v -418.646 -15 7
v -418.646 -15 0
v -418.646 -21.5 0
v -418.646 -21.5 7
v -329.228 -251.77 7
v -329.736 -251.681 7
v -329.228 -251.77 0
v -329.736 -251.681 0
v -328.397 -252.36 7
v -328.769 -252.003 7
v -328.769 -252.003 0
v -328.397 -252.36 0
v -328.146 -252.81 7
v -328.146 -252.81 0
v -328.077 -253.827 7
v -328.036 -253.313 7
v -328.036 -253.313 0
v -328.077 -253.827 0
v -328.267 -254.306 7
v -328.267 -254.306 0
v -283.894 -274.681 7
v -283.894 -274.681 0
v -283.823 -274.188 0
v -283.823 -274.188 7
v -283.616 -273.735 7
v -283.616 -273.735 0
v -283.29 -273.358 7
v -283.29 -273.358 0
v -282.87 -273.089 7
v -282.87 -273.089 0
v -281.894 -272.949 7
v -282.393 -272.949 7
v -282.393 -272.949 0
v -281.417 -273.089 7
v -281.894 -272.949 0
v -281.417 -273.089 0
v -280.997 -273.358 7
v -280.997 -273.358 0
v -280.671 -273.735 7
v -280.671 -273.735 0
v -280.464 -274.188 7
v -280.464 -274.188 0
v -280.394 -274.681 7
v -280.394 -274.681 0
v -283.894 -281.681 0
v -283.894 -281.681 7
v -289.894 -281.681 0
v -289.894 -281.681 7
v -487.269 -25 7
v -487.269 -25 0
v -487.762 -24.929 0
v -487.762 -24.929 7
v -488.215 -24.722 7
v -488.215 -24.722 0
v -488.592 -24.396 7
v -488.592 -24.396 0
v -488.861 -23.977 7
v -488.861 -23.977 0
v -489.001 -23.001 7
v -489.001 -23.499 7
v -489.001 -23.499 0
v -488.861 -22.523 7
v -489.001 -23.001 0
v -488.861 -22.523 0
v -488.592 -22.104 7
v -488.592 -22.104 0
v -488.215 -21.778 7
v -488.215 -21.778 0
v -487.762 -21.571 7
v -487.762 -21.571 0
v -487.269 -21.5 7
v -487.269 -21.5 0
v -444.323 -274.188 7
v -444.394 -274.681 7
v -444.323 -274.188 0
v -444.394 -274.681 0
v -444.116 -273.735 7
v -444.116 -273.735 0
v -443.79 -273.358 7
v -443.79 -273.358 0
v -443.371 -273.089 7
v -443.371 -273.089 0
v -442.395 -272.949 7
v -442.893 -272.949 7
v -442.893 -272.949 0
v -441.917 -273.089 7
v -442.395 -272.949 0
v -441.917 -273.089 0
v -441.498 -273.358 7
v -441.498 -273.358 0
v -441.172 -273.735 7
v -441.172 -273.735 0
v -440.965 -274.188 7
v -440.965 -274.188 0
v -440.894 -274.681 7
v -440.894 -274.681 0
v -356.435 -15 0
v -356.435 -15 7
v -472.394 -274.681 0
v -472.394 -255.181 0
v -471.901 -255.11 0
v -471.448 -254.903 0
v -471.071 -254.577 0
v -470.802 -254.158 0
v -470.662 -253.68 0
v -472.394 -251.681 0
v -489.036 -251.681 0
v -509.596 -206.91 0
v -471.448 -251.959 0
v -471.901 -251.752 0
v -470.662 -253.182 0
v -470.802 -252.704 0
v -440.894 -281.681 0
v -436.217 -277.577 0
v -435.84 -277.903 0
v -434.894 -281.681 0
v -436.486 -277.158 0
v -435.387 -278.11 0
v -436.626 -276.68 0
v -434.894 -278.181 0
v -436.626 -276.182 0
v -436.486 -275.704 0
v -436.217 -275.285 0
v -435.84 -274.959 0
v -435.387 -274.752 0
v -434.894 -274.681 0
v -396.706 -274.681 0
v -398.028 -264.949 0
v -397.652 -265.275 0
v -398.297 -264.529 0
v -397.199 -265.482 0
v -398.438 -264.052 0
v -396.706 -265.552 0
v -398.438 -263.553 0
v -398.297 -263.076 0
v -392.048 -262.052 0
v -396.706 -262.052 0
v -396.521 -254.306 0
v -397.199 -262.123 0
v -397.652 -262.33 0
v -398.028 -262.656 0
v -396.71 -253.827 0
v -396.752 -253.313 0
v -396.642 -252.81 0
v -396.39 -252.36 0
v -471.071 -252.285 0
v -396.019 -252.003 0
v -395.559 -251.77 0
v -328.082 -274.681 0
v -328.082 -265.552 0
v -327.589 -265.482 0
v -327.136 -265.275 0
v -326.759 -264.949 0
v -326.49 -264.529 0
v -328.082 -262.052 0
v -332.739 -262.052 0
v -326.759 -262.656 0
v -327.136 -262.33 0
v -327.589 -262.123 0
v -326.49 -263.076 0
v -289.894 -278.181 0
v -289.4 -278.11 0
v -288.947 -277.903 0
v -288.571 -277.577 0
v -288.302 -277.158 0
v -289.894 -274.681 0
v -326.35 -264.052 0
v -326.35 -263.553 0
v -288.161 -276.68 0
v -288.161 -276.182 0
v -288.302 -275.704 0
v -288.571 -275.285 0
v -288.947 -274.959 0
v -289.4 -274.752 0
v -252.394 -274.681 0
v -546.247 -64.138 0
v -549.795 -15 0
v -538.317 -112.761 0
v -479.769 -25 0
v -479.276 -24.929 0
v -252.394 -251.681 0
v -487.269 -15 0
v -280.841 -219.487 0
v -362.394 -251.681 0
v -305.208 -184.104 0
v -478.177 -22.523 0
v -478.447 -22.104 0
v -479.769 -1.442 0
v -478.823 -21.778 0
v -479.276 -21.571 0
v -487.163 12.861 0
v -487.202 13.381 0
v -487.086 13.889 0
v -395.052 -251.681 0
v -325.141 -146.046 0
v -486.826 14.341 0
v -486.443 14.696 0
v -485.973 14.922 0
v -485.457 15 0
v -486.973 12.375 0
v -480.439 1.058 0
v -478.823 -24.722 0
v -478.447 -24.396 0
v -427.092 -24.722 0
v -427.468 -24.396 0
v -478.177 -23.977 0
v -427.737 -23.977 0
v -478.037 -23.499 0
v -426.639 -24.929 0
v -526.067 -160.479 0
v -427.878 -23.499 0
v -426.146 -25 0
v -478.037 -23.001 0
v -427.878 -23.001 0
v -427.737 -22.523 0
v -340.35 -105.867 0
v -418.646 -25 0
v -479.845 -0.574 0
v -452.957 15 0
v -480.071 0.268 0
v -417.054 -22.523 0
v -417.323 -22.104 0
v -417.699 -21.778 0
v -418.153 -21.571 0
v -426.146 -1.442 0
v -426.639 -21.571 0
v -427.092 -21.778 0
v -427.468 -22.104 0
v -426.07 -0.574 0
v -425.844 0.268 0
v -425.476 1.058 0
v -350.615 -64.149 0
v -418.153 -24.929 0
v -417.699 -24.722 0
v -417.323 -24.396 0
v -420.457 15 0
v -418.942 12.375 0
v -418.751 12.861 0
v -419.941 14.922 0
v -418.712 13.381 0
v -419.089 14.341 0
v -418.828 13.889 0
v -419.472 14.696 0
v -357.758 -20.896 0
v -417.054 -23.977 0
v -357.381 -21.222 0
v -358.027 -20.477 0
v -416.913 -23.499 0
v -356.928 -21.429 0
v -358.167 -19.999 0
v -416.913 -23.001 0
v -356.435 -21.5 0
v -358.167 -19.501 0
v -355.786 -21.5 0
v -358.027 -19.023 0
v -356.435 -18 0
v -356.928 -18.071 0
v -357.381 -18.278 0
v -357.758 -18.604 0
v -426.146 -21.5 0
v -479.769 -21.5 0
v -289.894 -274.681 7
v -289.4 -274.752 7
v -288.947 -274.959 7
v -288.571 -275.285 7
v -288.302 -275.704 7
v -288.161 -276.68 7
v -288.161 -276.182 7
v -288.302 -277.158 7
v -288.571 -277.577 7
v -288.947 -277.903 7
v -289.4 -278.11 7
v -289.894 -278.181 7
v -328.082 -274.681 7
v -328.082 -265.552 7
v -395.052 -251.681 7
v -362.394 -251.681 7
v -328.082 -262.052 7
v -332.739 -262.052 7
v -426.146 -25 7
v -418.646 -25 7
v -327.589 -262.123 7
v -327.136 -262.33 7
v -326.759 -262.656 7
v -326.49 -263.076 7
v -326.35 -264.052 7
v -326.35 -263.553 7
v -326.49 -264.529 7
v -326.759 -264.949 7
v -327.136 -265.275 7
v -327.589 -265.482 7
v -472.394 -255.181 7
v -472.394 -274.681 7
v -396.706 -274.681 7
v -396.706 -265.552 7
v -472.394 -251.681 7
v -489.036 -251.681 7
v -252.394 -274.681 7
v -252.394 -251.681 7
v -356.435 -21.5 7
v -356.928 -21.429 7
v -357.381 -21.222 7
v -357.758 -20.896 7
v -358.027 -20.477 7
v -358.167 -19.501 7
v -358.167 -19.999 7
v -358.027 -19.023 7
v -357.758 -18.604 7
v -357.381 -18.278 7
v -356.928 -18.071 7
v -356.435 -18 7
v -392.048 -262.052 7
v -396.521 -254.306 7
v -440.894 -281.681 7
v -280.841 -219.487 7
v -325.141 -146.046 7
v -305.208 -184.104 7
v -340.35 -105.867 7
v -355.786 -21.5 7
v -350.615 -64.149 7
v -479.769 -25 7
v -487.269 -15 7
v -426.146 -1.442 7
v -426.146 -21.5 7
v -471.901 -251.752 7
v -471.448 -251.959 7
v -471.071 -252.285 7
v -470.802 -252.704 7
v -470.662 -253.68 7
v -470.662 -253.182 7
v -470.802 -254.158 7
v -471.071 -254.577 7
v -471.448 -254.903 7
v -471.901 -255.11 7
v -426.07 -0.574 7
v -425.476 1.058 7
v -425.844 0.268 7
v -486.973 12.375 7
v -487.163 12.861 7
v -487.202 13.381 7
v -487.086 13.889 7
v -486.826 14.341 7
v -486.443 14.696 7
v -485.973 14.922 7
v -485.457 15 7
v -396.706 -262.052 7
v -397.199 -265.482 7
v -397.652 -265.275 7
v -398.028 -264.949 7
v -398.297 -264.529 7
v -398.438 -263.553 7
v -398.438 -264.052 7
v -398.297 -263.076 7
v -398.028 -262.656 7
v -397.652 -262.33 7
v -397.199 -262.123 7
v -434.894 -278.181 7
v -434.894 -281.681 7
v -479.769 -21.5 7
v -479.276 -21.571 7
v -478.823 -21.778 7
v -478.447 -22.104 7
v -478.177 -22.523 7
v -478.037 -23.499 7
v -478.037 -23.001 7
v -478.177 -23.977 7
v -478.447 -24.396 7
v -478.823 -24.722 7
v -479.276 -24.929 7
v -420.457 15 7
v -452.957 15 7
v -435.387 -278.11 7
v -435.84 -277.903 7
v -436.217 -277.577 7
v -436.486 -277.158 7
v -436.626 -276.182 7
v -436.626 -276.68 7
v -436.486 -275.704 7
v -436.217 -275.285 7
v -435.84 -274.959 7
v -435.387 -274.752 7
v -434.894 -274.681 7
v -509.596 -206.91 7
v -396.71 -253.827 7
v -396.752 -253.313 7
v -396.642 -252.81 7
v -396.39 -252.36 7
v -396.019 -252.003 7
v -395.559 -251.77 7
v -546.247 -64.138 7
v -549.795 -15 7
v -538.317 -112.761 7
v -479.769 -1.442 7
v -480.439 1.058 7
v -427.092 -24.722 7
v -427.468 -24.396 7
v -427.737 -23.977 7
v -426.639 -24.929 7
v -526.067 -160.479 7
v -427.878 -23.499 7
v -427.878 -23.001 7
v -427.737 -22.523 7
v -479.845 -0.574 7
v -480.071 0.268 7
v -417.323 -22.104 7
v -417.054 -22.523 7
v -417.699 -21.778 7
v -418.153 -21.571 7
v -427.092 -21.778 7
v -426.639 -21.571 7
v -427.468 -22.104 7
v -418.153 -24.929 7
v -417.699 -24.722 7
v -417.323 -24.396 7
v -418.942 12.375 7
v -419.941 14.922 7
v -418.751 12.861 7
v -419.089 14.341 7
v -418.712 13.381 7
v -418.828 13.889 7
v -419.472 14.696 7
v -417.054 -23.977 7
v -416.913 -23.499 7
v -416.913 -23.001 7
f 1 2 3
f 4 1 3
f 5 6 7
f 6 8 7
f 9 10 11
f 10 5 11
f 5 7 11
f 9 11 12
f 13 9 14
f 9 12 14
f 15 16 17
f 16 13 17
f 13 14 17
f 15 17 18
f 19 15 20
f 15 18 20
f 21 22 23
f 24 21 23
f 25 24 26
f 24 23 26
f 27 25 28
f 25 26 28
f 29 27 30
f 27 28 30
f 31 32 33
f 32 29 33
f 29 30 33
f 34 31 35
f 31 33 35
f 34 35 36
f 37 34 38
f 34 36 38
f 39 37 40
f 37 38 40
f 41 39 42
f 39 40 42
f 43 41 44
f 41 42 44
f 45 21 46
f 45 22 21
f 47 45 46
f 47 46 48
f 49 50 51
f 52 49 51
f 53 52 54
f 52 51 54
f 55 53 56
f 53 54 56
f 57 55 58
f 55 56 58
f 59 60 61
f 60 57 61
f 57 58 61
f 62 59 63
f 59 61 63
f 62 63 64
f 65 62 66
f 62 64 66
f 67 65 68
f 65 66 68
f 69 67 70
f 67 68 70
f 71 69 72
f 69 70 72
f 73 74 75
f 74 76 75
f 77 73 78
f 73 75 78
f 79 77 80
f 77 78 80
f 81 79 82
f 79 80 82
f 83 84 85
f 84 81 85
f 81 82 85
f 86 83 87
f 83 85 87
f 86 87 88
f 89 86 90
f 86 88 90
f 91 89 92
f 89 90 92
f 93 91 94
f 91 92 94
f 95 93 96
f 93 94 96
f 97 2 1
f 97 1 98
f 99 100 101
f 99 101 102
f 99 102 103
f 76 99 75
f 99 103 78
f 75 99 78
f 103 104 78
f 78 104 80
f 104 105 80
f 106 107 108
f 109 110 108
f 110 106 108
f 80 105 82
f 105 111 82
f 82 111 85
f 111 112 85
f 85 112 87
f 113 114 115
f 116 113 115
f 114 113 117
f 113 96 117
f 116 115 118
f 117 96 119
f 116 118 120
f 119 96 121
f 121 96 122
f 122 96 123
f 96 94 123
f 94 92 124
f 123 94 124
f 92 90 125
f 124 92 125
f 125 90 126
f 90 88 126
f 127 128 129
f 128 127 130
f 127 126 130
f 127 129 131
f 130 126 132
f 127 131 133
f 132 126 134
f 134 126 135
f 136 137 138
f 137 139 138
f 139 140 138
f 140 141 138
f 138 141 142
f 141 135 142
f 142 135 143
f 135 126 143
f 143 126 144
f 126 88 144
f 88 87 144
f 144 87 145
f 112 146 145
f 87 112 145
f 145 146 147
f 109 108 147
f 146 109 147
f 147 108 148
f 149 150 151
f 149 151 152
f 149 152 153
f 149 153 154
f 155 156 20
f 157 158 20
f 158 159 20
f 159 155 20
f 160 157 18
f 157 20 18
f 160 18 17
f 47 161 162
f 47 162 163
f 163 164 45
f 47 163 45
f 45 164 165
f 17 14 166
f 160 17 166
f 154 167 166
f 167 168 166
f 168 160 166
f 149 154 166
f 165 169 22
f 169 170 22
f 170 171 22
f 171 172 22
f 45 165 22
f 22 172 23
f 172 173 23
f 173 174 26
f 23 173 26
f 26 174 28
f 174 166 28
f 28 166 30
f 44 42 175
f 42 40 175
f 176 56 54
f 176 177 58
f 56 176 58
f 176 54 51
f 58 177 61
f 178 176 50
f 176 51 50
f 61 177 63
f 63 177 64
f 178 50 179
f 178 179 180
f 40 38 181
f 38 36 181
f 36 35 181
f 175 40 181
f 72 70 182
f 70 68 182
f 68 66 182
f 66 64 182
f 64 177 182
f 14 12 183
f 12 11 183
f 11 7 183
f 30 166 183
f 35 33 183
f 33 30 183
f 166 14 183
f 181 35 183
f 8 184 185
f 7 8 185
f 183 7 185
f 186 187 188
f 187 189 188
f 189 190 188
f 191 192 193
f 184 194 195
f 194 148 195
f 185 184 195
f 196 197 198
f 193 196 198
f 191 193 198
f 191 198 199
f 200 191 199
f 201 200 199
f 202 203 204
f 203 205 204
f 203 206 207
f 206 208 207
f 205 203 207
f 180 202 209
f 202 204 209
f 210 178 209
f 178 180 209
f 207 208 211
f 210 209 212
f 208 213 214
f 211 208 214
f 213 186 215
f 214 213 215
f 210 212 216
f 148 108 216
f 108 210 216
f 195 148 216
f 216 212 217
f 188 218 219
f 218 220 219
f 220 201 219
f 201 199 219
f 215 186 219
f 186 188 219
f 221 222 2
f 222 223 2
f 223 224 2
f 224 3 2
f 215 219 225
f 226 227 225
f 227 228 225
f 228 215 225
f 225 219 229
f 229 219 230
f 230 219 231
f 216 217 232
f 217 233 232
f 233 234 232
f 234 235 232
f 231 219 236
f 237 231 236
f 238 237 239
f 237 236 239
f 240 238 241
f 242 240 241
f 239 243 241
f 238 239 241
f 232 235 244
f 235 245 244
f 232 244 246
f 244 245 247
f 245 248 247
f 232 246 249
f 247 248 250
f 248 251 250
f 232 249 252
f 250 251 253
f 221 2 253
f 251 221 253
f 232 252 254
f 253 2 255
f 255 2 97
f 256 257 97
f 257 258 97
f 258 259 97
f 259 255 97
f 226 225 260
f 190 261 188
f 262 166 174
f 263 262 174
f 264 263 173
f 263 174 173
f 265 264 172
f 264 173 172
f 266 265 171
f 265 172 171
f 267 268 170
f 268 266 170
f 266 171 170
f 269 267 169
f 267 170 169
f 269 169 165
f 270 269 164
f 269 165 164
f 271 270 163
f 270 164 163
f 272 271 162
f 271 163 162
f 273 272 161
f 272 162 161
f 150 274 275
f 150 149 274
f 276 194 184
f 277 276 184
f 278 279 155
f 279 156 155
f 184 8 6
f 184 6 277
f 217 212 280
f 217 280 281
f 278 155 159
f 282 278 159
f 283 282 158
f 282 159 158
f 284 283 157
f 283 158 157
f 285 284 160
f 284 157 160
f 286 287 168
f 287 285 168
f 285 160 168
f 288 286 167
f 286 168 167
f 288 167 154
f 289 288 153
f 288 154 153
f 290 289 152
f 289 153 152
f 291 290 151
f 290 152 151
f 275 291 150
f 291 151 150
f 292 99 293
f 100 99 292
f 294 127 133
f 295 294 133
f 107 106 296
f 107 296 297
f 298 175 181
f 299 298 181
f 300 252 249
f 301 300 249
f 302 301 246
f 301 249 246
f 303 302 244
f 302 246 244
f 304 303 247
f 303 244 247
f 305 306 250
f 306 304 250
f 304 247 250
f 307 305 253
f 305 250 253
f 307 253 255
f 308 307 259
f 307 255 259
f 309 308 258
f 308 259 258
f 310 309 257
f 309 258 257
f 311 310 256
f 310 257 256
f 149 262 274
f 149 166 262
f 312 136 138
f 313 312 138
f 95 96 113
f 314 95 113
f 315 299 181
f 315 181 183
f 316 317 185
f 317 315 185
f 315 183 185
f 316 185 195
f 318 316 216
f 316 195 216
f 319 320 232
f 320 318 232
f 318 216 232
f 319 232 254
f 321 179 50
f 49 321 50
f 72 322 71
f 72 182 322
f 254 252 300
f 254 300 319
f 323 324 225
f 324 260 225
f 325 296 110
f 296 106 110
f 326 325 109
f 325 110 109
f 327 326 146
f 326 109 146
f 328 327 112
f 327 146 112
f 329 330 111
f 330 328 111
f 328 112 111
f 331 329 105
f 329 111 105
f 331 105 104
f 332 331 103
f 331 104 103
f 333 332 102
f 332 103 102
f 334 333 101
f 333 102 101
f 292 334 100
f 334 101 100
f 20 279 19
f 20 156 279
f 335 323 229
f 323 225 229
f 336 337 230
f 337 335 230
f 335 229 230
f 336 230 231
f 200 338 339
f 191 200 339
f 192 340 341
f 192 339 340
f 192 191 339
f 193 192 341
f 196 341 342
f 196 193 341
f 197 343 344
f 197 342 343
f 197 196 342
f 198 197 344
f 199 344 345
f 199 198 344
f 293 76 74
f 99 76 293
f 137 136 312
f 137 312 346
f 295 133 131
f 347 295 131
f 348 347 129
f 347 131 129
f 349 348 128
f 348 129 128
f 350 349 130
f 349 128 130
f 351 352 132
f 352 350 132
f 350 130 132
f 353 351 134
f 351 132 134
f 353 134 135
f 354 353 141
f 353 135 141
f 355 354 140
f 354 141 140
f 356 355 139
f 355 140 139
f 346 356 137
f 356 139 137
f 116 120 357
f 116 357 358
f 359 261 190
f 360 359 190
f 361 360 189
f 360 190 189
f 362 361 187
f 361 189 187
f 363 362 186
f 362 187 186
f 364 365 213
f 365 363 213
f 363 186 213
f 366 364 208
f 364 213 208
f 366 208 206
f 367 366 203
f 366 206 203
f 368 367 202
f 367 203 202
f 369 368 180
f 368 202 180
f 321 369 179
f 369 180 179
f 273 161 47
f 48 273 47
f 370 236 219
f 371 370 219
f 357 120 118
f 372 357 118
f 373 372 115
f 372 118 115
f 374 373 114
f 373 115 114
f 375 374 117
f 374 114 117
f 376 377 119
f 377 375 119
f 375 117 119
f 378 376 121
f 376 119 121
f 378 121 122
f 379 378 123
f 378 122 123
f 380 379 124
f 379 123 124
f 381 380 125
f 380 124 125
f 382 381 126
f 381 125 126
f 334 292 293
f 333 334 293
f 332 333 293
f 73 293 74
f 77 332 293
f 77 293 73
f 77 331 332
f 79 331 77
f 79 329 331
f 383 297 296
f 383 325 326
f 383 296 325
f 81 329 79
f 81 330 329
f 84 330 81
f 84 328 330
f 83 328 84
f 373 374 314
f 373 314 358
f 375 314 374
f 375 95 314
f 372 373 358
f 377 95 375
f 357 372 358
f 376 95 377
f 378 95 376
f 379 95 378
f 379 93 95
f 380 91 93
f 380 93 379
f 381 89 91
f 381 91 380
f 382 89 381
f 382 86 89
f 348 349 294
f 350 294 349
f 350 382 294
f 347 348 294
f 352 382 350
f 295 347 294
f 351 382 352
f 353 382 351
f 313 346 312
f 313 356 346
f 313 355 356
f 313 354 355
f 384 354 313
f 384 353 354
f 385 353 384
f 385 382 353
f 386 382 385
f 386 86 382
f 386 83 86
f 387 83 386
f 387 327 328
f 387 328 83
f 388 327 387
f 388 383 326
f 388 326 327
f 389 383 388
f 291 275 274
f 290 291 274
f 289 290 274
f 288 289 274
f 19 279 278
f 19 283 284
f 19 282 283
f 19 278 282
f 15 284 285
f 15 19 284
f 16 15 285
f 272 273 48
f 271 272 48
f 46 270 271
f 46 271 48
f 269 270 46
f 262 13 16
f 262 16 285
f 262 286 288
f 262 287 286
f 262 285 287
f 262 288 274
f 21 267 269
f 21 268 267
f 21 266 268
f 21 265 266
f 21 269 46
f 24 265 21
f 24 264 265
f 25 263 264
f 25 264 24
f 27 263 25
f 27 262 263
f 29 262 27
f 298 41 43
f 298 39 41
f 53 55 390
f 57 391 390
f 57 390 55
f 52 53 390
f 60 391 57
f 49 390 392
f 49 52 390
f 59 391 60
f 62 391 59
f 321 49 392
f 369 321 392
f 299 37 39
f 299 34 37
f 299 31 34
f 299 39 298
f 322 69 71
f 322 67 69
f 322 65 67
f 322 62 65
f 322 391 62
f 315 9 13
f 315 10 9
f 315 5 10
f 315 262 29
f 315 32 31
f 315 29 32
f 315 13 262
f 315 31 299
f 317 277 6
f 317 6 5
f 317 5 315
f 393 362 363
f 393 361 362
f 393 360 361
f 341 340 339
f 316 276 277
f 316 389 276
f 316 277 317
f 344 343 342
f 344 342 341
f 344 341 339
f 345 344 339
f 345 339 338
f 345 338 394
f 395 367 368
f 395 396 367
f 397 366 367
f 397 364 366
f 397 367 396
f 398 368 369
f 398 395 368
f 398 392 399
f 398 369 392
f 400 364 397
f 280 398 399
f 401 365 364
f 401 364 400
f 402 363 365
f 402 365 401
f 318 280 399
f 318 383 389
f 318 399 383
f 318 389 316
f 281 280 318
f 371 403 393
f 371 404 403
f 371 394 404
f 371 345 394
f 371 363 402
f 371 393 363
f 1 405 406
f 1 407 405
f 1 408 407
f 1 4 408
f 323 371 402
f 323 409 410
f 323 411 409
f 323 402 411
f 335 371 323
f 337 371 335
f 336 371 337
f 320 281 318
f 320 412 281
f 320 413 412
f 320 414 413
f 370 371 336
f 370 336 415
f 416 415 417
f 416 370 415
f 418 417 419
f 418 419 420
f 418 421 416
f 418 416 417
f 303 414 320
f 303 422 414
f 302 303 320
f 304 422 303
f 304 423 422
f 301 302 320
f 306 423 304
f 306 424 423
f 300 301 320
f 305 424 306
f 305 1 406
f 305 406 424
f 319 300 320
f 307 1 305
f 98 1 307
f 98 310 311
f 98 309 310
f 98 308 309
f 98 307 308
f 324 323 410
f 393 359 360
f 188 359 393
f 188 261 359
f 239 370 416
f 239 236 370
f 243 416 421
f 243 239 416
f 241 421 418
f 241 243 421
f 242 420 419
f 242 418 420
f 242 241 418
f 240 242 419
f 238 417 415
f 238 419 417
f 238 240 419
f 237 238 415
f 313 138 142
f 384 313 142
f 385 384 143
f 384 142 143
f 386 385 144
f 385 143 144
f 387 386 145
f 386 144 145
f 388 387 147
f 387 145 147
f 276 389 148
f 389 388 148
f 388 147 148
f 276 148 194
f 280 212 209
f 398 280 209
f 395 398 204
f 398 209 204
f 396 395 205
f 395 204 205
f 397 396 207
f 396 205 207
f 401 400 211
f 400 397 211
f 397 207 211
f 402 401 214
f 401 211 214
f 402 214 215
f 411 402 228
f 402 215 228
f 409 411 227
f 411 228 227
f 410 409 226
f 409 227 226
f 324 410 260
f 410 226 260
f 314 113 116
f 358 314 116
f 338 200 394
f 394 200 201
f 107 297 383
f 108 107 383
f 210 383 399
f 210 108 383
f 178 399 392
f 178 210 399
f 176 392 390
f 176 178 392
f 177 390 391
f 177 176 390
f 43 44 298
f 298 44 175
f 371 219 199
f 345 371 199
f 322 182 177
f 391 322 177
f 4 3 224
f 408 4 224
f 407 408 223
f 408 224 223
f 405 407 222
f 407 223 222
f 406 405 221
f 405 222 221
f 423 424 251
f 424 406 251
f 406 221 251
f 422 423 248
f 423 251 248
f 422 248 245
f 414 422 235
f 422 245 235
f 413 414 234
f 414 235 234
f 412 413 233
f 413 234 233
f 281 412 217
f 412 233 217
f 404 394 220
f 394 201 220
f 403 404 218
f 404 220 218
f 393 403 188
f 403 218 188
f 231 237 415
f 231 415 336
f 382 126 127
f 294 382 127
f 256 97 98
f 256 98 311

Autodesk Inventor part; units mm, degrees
ref_plane "YZ Plane" through (0, 0, 0) normal (1, 0, 0) x (0, 1, 0)
ref_plane "XZ Plane" through (0, 0, 0) normal (0, 1, 0) x (-1, 0, 0)
ref_plane "XY Plane" through (0, 0, 0) normal (0, 0, 1) x (1, 0, 0)
sketch "Sketch1" plane through (0, 0, 0) normal (0, 0, 1) x (1, 0, 0)
  arc A0 (0, 550) -> (-200, 512.3475) centre (0, 0) ccw construction
  line L0 (-150, -512.3475) -> (-150, -323.3356) construction
  line L1 (-472.3938, -281.6809) -> (-252.3938, -281.6809) construction
  line L2 (-489.0365, 251.6809) -> (-252.3938, 251.6809) construction
  line L3 (-150, 323.3356) -> (-150, 512.3475) construction
  line L4 (-472.3938, 281.6809) -> (-252.3938, 281.6809) construction
  line L5 (-472.3938, -251.6809) -> (-252.3938, -251.6809) construction
  line L6 (-356.435, 15) -> (-576.435, 15) construction
  line L7 (-472.3938, -274.681) -> (-472.3938, -251.6809) construction
  line L8 (-252.3938, -281.6809) -> (-252.3938, -251.6809) construction
  line L9 (-252.3938, 281.6809) -> (-252.3938, 251.6809) construction
  line L10 (-472.3938, 281.6809) -> (-472.3938, 251.6809) construction
  line L11 (-356.435, 15) -> (-356.435, -15) construction
  line L12 (-356.435, -15) -> (-576.435, -15) construction
  line L13 (-576.435, -15) -> (-576.435, 15) construction
  arc A1 (0, 356.435) -> (-150, 323.3356) centre (0, 0) ccw construction
  arc A2 (-150, -323.3356) -> (0, -356.435) centre (0, 0) ccw construction
  arc A3 (-156.5, -512.3475) -> (-160, -512.3475) centre (-158.25, -512.3475) ccw construction
  arc A4 (-190, -512.3475) -> (-193.5, -512.3475) centre (-191.75, -512.3475) ccw construction
  line L14 (-178.75, -519.0975) -> (-175, -519.0975) construction
  line L15 (-178.75, -529.0975) -> (-175, -529.0975) construction
  line L16 (-175, -519.0975) -> (-175, -529.0975) construction
  arc A5 (-178.75, -519.0975) -> (-178.75, -522.5975) centre (-178.75, -520.8475) ccw construction
  arc A6 (-178.75, -525.5975) -> (-178.75, -529.0975) centre (-178.75, -527.3475) ccw construction
  line L17 (-171.25, -519.0975) -> (-175, -519.0975) construction
  line L18 (-171.25, -529.0975) -> (-175, -529.0975) construction
  arc A7 (-171.25, -522.5975) -> (-171.25, -519.0975) centre (-171.25, -520.8475) ccw construction
  arc A8 (-171.25, -529.0975) -> (-171.25, -525.5975) centre (-171.25, -527.3475) ccw construction
  line L19 (-252.3938, 251.6809) -> (-489.0365, 251.6809) construction
  arc A9 (-192.6667, 512.3475) -> (-190, 512.3475) centre (-191.3333, 512.3475) ccw construction
  line L20 (-157.3333, 512.3475) -> (-150, 512.3475) construction
  line L21 (-192.6667, 512.3475) -> (-200, 512.3475) construction
  arc A10 (-160, 512.3475) -> (-157.3333, 512.3475) centre (-158.6667, 512.3475) ccw construction
  line L22 (-171.25, 517.8475) -> (-175, 517.8475) construction
  line L23 (-171.25, 520.5142) -> (-171.25, 525.1809) construction
  line L24 (-161.3333, 532.3475) -> (-188.6667, 532.3475) construction
  line L25 (-190, 531.0142) -> (-190, 512.3475) construction
  line L26 (-160, 531.0142) -> (-160, 512.3475) construction
  arc A11 (-160, 531.0142) -> (-161.3333, 532.3475) centre (-161.3333, 531.0142) ccw construction
  arc A12 (-188.6667, 532.3475) -> (-190, 531.0142) centre (-188.6667, 531.0142) ccw construction
  line L27 (-171.25, 527.8475) -> (-175, 527.8475) construction
  line L28 (-175, 532.3475) -> (-175, 535.9358) construction
  line L29 (-175, 517.8475) -> (-175, 527.8475) construction
  arc A13 (-171.25, 517.8475) -> (-171.25, 520.5142) centre (-171.25, 519.1809) ccw construction
  arc A14 (-171.25, 525.1809) -> (-171.25, 527.8475) centre (-171.25, 526.5142) ccw construction
  line L30 (-178.75, 517.8475) -> (-175, 517.8475) construction
  arc A15 (-178.75, 520.5142) -> (-178.75, 517.8475) centre (-178.75, 519.1809) ccw construction
  line L31 (-178.75, 520.5142) -> (-178.75, 525.1809) construction
  arc A16 (-178.75, 527.8475) -> (-178.75, 525.1809) centre (-178.75, 526.5142) ccw construction
  line L32 (-178.75, 527.8475) -> (-175, 527.8475) construction
  arc A17 (-334.9122, -265.623) -> (-335.582, -268.123) centre (-330.582, -268.123) ccw construction
  line L33 (-328.3782, -254.3059) -> (-334.9122, -265.623) construction
  arc A18 (-328.3782, -254.3059) -> (-329.8938, -251.6809) centre (-329.8938, -253.4309) ccw construction
  line L34 (-329.8938, -251.6809) -> (-394.8938, -251.6809) construction
  line L35 (-362.3938, -251.6809) -> (-362.3938, -293.6041) construction
  arc A19 (-389.2055, -268.123) -> (-389.8754, -265.623) centre (-394.2055, -268.123) ccw construction
  arc A20 (-394.8938, -251.6809) -> (-396.4093, -254.3059) centre (-394.8938, -253.4309) ccw construction
  line L36 (-396.4093, -254.3059) -> (-389.8754, -265.623) construction
  arc A21 (-389.2055, -291.6809) -> (-389.2055, -288.1809) centre (-389.2055, -289.9309) ccw construction
  line L37 (-389.2055, -291.6809) -> (-396.7055, -291.6809) construction
  line L38 (-396.7055, -281.6809) -> (-472.3938, -281.6809) construction
  line L39 (-328.082, -281.6809) -> (-252.3938, -281.6809) construction
  line L40 (-252.3938, -287.3475) -> (-210.8964, -287.3475) construction
  arc A22 (-150, 323.3356) -> (-356.1192, -15) centre (0, 0) ccw construction
  arc A23 (-210.8964, -287.3475) -> (-150, -323.3356) centre (0, 0) ccw construction
  arc A24 (-200, 512.3475) -> (-549.7954, -15) centre (0, 0) ccw construction
  arc A25 (-472.3938, -281.6809) -> (-246.475, -491.6809) centre (0, 0) ccw construction
  line L41 (-171.25, -436.0915) -> (-171.25, -399.5915) construction
  line L42 (-178.75, -436.0915) -> (-178.75, -399.5915) construction
  line L43 (-177, -437.8415) -> (-173, -437.8415) construction
  line L44 (-177, -397.8415) -> (-173, -397.8415) construction
  arc A26 (-177, -397.8415) -> (-178.75, -399.5915) centre (-177, -399.5915) ccw construction
  arc A27 (-178.75, -436.0915) -> (-177, -437.8415) centre (-177, -436.0915) ccw construction
  arc A28 (-173, -437.8415) -> (-171.25, -436.0915) centre (-173, -436.0915) ccw construction
  arc A29 (-171.25, -399.5915) -> (-173, -397.8415) centre (-173, -399.5915) ccw construction
  line L45 (-200, -512.3475) -> (-200, -491.6809) construction
  arc A30 (-200, -491.6809) -> (-203.5, -491.6809) centre (-201.75, -491.6809) ccw construction
  line L46 (-160, -512.3475) -> (-160, -532.5975) construction
  line L47 (-161.75, -534.3475) -> (-188.25, -534.3475) construction
  line L48 (-190, -532.5975) -> (-190, -512.3475) construction
  line L49 (-171.25, -522.5975) -> (-171.25, -525.5975) construction
  line L50 (-178.75, -522.5975) -> (-178.75, -525.5975) construction
  arc A31 (-190, -532.5975) -> (-188.25, -534.3475) centre (-188.25, -532.5975) ccw construction
  arc A32 (-161.75, -534.3475) -> (-160, -532.5975) centre (-161.75, -532.5975) ccw construction
  line L51 (-156.5, -512.3475) -> (-150, -512.3475) construction
  line L52 (-193.5, -512.3475) -> (-200, -512.3475) construction
  line L53 (-203.5, -491.6809) -> (-246.475, -491.6809) construction
  arc A33 (-396.7055, -288.1809) -> (-396.7055, -291.6809) centre (-396.7055, -289.9309) ccw construction
  line L54 (-396.7055, -281.6809) -> (-396.7055, -288.1809) construction
  line L55 (-389.2055, -288.1809) -> (-389.2055, -268.123) construction
  arc A34 (-335.582, -288.1809) -> (-335.582, -291.6809) centre (-335.582, -289.9309) ccw construction
  line L56 (-335.582, -291.6809) -> (-328.082, -291.6809) construction
  arc A35 (-328.082, -291.6809) -> (-328.082, -288.1809) centre (-328.082, -289.9309) ccw construction
  line L57 (-328.082, -281.6809) -> (-328.082, -288.1809) construction
  line L58 (-335.582, -288.1809) -> (-335.582, -268.123) construction
  arc A36 (-252.3938, -283.8475) -> (-252.3938, -287.3475) centre (-252.3938, -285.5975) ccw construction
  line L59 (-252.3938, -283.8475) -> (-252.3938, -281.6809) construction
  arc A37 (-479.7691, -25) -> (-479.7691, -21.5) centre (-479.7691, -23.25) ccw
  arc A38 (-479.7691, -1.4421) -> (-480.4389, 1.0579) centre (-484.7691, -1.4421) ccw
  line L60 (-486.9729, 12.375) -> (-480.4389, 1.0579)
  arc A39 (-485.4573, 15) -> (-486.9729, 12.375) centre (-485.4573, 13.25) ccw
  line L61 (-420.4573, 15) -> (-485.4573, 15)
  arc A40 (-425.4757, 1.0579) -> (-426.1456, -1.4421) centre (-421.1456, -1.4421) ccw
  arc A41 (-418.9418, 12.375) -> (-420.4573, 15) centre (-420.4573, 13.25) ccw
  line L62 (-418.9418, 12.375) -> (-425.4757, 1.0579)
  line L63 (-452.9573, 15) -> (-452.9573, -26.9232)
  line L64 (-479.7691, -25) -> (-487.2691, -25)
  line L65 (-487.2691, -15) -> (-549.7954, -15)
  arc A42 (-487.2691, -21.5) -> (-487.2691, -25) centre (-487.2691, -23.25) ccw
  line L66 (-487.2691, -15) -> (-487.2691, -21.5)
  line L67 (-479.7691, -21.5) -> (-479.7691, -1.4421)
  line L68 (-426.1456, -21.5) -> (-426.1456, -1.4421)
  arc A43 (-426.1456, -21.5) -> (-426.1456, -25) centre (-426.1456, -23.25) ccw
  line L69 (-426.1456, -25) -> (-418.6456, -25)
  arc A44 (-418.6456, -25) -> (-418.6456, -21.5) centre (-418.6456, -23.25) ccw
  line L70 (-418.6456, -15) -> (-418.6456, -21.5)
  line L71 (276.2049, -135.3556) -> (280.6774, -127.609)
  line L72 (279.2083, -124.984) -> (246.5502, -124.984)
  arc A45 (319.0505, -151.484) -> (319.0505, -147.984) centre (319.0505, -149.734) ccw
  arc A46 (328.5476, -148.0839) -> (325.0505, -147.9841) centre (326.8005, -147.9841) ccw
  line L73 (319.0505, -147.984) -> (280.8619, -147.984)
  arc A47 (214.0502, -164.7817) -> (212.5346, -167.4067) centre (214.0502, -166.5317) ccw
  arc A48 (280.5657, -167.4067) -> (279.0502, -164.7817) centre (279.0502, -166.5317) ccw
  arc A49 (274.0318, -178.7238) -> (273.3619, -181.2238) centre (278.3619, -181.2238) ccw
  line L74 (280.5657, -167.4067) -> (274.0318, -178.7238)
  line L75 (273.3619, -201.2817) -> (273.3619, -181.2238)
  arc A50 (273.3619, -201.2817) -> (273.3619, -204.7817) centre (273.3619, -203.0317) ccw
  line L76 (273.3619, -204.7817) -> (280.8619, -204.7817)
  arc A51 (280.8619, -204.7817) -> (280.8619, -201.2817) centre (280.8619, -203.0317) ccw
  line L77 (280.8619, -194.7817) -> (280.8619, -201.2817)
  line L78 (212.2384, -194.7817) -> (212.2384, -201.2817)
  arc A52 (212.2384, -201.2817) -> (212.2384, -204.7817) centre (212.2384, -203.0317) ccw
  arc A53 (219.7384, -204.7817) -> (219.7384, -201.2817) centre (219.7384, -203.0317) ccw
  line L79 (279.0502, -164.7817) -> (214.0502, -164.7817)
  line L80 (219.7384, -201.2817) -> (219.7384, -181.2238)
  line L81 (219.7384, -204.7817) -> (212.2384, -204.7817)
  arc A54 (219.7384, -181.2238) -> (219.0686, -178.7238) centre (214.7384, -181.2238) ccw
  line L82 (212.5346, -167.4067) -> (219.0686, -178.7238)
  line L83 (212.2384, -194.7817) -> (136.5502, -194.7817)
  line L84 (280.8619, -194.7817) -> (356.5502, -194.7817)
  line L85 (325.0505, -147.9841) -> (325.0505, -154.9841)
  line L86 (325.0505, -154.9841) -> (319.0505, -154.9841)
  line L87 (319.0505, -151.484) -> (319.0505, -154.9841)
  line L88 (246.5502, -124.984) -> (246.5502, -110.6064)
  arc A55 (280.6774, -127.609) -> (279.2083, -124.984) centre (279.1622, -126.7334) ccw
  arc A56 (280.8619, -138.8556) -> (280.8619, -135.3556) centre (280.8619, -137.1056) ccw
  line L89 (276.2049, -135.3556) -> (280.8619, -135.3556)
  line L90 (246.5502, -164.7817) -> (246.5502, -170.2759)
  line L91 (280.8619, -147.984) -> (280.8619, -138.8556)
  arc A57 (168.0499, -147.9841) -> (164.5527, -148.0839) centre (166.2999, -147.9841) ccw
  arc A58 (174.0499, -147.984) -> (174.0499, -151.484) centre (174.0499, -149.734) ccw
  line L92 (213.8921, -124.984) -> (246.5502, -124.984)
  line L93 (174.0499, -147.984) -> (212.2384, -147.984)
  line L94 (216.8955, -135.3556) -> (212.423, -127.609)
  line L95 (168.0499, -147.9841) -> (168.0499, -154.9841)
  line L96 (168.0499, -154.9841) -> (174.0499, -154.9841)
  line L97 (174.0499, -151.484) -> (174.0499, -154.9841)
  arc A59 (213.8921, -124.984) -> (212.423, -127.609) centre (213.9382, -126.7334) ccw
  arc A60 (212.2384, -135.3556) -> (212.2384, -138.8556) centre (212.2384, -137.1056) ccw
  line L98 (216.8955, -135.3556) -> (212.2384, -135.3556)
  line L99 (212.2384, -147.984) -> (212.2384, -138.8556)
  arc A61 (-280.3935, -274.681) -> (-283.8935, -274.681) centre (-282.1435, -274.681) ccw
  arc A62 (-289.8935, -278.1809) -> (-289.8935, -274.6809) centre (-289.8935, -276.4309) ccw
  line L100 (-329.7357, -251.6809) -> (-362.3938, -251.6809)
  line L101 (-289.8935, -274.6809) -> (-328.082, -274.6809)
  line L102 (-332.7391, -262.0525) -> (-328.2666, -254.3059)
  line L103 (-283.8935, -274.681) -> (-283.8935, -281.681)
  line L104 (-283.8935, -281.681) -> (-289.8935, -281.681)
  line L105 (-289.8935, -278.1809) -> (-289.8935, -281.681)
  arc A63 (-328.2666, -254.3059) -> (-329.7357, -251.6809) centre (-329.7818, -253.4303) ccw
  arc A64 (-328.082, -265.5525) -> (-328.082, -262.0525) centre (-328.082, -263.8025) ccw
  line L106 (-332.7391, -262.0525) -> (-328.082, -262.0525)
  line L107 (-328.082, -274.6809) -> (-328.082, -265.5525)
  line L108 (-392.0485, -262.0525) -> (-396.7055, -262.0525)
  arc A65 (-396.7055, -262.0525) -> (-396.7055, -265.5525) centre (-396.7055, -263.8025) ccw
  line L109 (-392.0485, -262.0525) -> (-396.521, -254.3059)
  arc A66 (-395.0519, -251.6809) -> (-396.521, -254.3059) centre (-395.0058, -253.4303) ccw
  line L110 (-396.7055, -274.6809) -> (-396.7055, -265.5525)
  line L111 (-434.8941, -278.1809) -> (-434.8941, -281.681)
  line L112 (-434.8941, -274.6809) -> (-396.7055, -274.6809)
  arc A67 (-434.8941, -274.6809) -> (-434.8941, -278.1809) centre (-434.8941, -276.4309) ccw
  line L113 (-440.8941, -281.681) -> (-434.8941, -281.681)
  line L114 (-440.8941, -274.681) -> (-440.8941, -281.681)
  arc A68 (-440.8941, -274.681) -> (-444.3941, -274.681) centre (-442.6441, -274.681) ccw
  line L115 (-395.0519, -251.6809) -> (-362.3938, -251.6809)
  arc A69 (-355.7859, -21.5) -> (-252.3938, -251.6809) centre (0, 0) ccw
  arc A70 (-549.7954, -15) -> (-489.0365, -251.6809) centre (0, 0) ccw
  line L116 (-356.435, -15) -> (-356.435, -18)
  arc A71 (-356.435, -18) -> (-356.435, -21.5) centre (-356.435, -19.75) ccw
  line L117 (-356.435, -21.5) -> (-355.7859, -21.5)
  line L118 (-356.1192, -15) -> (-356.435, -15) construction
  line L119 (-356.435, -15) -> (-549.7954, -15) construction
  line L120 (-418.6456, -15) -> (-356.435, -15)
  line L121 (-444.3941, -274.681) -> (-472.3938, -274.681)
  line L122 (-280.3935, -274.681) -> (-252.3938, -274.681)
  line L123 (-252.3938, -274.7808) -> (-252.3938, -251.6809)
  arc A72 (-472.3938, -255.1809) -> (-472.3938, -251.6809) centre (-472.3938, -253.4309) ccw
  line L124 (-472.3938, -274.681) -> (-472.3938, -255.1809)
  line L125 (-472.3938, -251.6809) -> (-489.0365, -251.6809)
  point P0 (0, 512.3475)
  point P1 (0, -512.3475)
  point P2 (-190, -534.3475)
  point P3 (-160, -534.3475)
  point P4 (-59.9119, -534.1417)
  point P5 (-160, 532.3475)
  point P6 (-190, 532.3475)
  point P7 (-389.2055, -259.0142)
  point P8 (-479.7691, 7.6667)
  point P9 (328.0311, -152.0673)
  point P10 (329.3645, -149.3173)
  point P11 (219.7384, -172.1151)
  point P12 (165.0692, -152.0673)
  point P13 (163.7359, -149.3173)
  point P14 (-280.9128, -278.7642)
  point P15 (-279.5795, -276.0142)
  point P16 (-443.8747, -278.7642)
  point P17 (-445.2081, -276.0142)
  dimension "d13" = 550
  dimension "d17" = 200
  dimension "d18" = 0
  dimension "d19" = 150
  dimension "d54" = 220
  dimension "d56" = 220
  dimension "d57" = 30
  dimension "d59" = 30
  dimension "d73" = 236.6809
  dimension "d74" = 236.6809
  dimension "d75" = 576.435
  dimension "d76" = 472.3938
  dimension "d77" = 472.3938
  dimension "d78" = 30
  dimension "d81" = 220
  dimension "d82" = 252.3938
  dimension "d85" = 356.435
  dimension "d88" = 3.5
  dimension "d89" = 30
  dimension "d90" = 22
  dimension "d91" = 3.5
  dimension "d103" = 3.75
  dimension "d104" = 3.75
  dimension "d105" = 2.6667
  dimension "d106" = 30
  dimension "d107" = 20
  dimension "d108" = 2.6667
  dimension "d109" = 1.3333
  dimension "d110" = 7.3333
  dimension "d111" = 7.3333
  dimension "d112" = 7.5
  dimension "d113" = 3.75
  dimension "d114" = 3.75
  dimension "d134" = 3.5
  dimension "d135" = 65
  dimension "d136" = 65
  dimension "d137" = 7.3333
  dimension "d138" = 60
  dimension "d139" = 5
  dimension "d140" = 7.5
  dimension "d148" = 1.75
  dimension "d151" = 40
  dimension "d152" = 74.506
  dimension "d153" = 20.6667
  dimension "d154" = 3.5
  dimension "d155" = 189.012
  dimension "d159" = 1.75
  dimension "d160" = 1.75
  dimension "d161" = 1.75
  dimension "d164" = 7.5
  dimension "d168" = 21.25
  dimension "d170" = 30
  dimension "d171" = 1.75
  dimension "d172" = 10
  dimension "d173" = 3.5
  dimension "d177" = 3.5
  dimension "d178" = 65
  dimension "d179" = 65
  dimension "d180" = 7.3333
  dimension "d181" = 60
  dimension "d182" = 5
  dimension "d183" = 7.5
  dimension "d185" = 1.75
  dimension "d186" = 10
extrude "Extrusion2" add sketch "Sketch1" along normal blind 7
properties part number "Support B - V2"
